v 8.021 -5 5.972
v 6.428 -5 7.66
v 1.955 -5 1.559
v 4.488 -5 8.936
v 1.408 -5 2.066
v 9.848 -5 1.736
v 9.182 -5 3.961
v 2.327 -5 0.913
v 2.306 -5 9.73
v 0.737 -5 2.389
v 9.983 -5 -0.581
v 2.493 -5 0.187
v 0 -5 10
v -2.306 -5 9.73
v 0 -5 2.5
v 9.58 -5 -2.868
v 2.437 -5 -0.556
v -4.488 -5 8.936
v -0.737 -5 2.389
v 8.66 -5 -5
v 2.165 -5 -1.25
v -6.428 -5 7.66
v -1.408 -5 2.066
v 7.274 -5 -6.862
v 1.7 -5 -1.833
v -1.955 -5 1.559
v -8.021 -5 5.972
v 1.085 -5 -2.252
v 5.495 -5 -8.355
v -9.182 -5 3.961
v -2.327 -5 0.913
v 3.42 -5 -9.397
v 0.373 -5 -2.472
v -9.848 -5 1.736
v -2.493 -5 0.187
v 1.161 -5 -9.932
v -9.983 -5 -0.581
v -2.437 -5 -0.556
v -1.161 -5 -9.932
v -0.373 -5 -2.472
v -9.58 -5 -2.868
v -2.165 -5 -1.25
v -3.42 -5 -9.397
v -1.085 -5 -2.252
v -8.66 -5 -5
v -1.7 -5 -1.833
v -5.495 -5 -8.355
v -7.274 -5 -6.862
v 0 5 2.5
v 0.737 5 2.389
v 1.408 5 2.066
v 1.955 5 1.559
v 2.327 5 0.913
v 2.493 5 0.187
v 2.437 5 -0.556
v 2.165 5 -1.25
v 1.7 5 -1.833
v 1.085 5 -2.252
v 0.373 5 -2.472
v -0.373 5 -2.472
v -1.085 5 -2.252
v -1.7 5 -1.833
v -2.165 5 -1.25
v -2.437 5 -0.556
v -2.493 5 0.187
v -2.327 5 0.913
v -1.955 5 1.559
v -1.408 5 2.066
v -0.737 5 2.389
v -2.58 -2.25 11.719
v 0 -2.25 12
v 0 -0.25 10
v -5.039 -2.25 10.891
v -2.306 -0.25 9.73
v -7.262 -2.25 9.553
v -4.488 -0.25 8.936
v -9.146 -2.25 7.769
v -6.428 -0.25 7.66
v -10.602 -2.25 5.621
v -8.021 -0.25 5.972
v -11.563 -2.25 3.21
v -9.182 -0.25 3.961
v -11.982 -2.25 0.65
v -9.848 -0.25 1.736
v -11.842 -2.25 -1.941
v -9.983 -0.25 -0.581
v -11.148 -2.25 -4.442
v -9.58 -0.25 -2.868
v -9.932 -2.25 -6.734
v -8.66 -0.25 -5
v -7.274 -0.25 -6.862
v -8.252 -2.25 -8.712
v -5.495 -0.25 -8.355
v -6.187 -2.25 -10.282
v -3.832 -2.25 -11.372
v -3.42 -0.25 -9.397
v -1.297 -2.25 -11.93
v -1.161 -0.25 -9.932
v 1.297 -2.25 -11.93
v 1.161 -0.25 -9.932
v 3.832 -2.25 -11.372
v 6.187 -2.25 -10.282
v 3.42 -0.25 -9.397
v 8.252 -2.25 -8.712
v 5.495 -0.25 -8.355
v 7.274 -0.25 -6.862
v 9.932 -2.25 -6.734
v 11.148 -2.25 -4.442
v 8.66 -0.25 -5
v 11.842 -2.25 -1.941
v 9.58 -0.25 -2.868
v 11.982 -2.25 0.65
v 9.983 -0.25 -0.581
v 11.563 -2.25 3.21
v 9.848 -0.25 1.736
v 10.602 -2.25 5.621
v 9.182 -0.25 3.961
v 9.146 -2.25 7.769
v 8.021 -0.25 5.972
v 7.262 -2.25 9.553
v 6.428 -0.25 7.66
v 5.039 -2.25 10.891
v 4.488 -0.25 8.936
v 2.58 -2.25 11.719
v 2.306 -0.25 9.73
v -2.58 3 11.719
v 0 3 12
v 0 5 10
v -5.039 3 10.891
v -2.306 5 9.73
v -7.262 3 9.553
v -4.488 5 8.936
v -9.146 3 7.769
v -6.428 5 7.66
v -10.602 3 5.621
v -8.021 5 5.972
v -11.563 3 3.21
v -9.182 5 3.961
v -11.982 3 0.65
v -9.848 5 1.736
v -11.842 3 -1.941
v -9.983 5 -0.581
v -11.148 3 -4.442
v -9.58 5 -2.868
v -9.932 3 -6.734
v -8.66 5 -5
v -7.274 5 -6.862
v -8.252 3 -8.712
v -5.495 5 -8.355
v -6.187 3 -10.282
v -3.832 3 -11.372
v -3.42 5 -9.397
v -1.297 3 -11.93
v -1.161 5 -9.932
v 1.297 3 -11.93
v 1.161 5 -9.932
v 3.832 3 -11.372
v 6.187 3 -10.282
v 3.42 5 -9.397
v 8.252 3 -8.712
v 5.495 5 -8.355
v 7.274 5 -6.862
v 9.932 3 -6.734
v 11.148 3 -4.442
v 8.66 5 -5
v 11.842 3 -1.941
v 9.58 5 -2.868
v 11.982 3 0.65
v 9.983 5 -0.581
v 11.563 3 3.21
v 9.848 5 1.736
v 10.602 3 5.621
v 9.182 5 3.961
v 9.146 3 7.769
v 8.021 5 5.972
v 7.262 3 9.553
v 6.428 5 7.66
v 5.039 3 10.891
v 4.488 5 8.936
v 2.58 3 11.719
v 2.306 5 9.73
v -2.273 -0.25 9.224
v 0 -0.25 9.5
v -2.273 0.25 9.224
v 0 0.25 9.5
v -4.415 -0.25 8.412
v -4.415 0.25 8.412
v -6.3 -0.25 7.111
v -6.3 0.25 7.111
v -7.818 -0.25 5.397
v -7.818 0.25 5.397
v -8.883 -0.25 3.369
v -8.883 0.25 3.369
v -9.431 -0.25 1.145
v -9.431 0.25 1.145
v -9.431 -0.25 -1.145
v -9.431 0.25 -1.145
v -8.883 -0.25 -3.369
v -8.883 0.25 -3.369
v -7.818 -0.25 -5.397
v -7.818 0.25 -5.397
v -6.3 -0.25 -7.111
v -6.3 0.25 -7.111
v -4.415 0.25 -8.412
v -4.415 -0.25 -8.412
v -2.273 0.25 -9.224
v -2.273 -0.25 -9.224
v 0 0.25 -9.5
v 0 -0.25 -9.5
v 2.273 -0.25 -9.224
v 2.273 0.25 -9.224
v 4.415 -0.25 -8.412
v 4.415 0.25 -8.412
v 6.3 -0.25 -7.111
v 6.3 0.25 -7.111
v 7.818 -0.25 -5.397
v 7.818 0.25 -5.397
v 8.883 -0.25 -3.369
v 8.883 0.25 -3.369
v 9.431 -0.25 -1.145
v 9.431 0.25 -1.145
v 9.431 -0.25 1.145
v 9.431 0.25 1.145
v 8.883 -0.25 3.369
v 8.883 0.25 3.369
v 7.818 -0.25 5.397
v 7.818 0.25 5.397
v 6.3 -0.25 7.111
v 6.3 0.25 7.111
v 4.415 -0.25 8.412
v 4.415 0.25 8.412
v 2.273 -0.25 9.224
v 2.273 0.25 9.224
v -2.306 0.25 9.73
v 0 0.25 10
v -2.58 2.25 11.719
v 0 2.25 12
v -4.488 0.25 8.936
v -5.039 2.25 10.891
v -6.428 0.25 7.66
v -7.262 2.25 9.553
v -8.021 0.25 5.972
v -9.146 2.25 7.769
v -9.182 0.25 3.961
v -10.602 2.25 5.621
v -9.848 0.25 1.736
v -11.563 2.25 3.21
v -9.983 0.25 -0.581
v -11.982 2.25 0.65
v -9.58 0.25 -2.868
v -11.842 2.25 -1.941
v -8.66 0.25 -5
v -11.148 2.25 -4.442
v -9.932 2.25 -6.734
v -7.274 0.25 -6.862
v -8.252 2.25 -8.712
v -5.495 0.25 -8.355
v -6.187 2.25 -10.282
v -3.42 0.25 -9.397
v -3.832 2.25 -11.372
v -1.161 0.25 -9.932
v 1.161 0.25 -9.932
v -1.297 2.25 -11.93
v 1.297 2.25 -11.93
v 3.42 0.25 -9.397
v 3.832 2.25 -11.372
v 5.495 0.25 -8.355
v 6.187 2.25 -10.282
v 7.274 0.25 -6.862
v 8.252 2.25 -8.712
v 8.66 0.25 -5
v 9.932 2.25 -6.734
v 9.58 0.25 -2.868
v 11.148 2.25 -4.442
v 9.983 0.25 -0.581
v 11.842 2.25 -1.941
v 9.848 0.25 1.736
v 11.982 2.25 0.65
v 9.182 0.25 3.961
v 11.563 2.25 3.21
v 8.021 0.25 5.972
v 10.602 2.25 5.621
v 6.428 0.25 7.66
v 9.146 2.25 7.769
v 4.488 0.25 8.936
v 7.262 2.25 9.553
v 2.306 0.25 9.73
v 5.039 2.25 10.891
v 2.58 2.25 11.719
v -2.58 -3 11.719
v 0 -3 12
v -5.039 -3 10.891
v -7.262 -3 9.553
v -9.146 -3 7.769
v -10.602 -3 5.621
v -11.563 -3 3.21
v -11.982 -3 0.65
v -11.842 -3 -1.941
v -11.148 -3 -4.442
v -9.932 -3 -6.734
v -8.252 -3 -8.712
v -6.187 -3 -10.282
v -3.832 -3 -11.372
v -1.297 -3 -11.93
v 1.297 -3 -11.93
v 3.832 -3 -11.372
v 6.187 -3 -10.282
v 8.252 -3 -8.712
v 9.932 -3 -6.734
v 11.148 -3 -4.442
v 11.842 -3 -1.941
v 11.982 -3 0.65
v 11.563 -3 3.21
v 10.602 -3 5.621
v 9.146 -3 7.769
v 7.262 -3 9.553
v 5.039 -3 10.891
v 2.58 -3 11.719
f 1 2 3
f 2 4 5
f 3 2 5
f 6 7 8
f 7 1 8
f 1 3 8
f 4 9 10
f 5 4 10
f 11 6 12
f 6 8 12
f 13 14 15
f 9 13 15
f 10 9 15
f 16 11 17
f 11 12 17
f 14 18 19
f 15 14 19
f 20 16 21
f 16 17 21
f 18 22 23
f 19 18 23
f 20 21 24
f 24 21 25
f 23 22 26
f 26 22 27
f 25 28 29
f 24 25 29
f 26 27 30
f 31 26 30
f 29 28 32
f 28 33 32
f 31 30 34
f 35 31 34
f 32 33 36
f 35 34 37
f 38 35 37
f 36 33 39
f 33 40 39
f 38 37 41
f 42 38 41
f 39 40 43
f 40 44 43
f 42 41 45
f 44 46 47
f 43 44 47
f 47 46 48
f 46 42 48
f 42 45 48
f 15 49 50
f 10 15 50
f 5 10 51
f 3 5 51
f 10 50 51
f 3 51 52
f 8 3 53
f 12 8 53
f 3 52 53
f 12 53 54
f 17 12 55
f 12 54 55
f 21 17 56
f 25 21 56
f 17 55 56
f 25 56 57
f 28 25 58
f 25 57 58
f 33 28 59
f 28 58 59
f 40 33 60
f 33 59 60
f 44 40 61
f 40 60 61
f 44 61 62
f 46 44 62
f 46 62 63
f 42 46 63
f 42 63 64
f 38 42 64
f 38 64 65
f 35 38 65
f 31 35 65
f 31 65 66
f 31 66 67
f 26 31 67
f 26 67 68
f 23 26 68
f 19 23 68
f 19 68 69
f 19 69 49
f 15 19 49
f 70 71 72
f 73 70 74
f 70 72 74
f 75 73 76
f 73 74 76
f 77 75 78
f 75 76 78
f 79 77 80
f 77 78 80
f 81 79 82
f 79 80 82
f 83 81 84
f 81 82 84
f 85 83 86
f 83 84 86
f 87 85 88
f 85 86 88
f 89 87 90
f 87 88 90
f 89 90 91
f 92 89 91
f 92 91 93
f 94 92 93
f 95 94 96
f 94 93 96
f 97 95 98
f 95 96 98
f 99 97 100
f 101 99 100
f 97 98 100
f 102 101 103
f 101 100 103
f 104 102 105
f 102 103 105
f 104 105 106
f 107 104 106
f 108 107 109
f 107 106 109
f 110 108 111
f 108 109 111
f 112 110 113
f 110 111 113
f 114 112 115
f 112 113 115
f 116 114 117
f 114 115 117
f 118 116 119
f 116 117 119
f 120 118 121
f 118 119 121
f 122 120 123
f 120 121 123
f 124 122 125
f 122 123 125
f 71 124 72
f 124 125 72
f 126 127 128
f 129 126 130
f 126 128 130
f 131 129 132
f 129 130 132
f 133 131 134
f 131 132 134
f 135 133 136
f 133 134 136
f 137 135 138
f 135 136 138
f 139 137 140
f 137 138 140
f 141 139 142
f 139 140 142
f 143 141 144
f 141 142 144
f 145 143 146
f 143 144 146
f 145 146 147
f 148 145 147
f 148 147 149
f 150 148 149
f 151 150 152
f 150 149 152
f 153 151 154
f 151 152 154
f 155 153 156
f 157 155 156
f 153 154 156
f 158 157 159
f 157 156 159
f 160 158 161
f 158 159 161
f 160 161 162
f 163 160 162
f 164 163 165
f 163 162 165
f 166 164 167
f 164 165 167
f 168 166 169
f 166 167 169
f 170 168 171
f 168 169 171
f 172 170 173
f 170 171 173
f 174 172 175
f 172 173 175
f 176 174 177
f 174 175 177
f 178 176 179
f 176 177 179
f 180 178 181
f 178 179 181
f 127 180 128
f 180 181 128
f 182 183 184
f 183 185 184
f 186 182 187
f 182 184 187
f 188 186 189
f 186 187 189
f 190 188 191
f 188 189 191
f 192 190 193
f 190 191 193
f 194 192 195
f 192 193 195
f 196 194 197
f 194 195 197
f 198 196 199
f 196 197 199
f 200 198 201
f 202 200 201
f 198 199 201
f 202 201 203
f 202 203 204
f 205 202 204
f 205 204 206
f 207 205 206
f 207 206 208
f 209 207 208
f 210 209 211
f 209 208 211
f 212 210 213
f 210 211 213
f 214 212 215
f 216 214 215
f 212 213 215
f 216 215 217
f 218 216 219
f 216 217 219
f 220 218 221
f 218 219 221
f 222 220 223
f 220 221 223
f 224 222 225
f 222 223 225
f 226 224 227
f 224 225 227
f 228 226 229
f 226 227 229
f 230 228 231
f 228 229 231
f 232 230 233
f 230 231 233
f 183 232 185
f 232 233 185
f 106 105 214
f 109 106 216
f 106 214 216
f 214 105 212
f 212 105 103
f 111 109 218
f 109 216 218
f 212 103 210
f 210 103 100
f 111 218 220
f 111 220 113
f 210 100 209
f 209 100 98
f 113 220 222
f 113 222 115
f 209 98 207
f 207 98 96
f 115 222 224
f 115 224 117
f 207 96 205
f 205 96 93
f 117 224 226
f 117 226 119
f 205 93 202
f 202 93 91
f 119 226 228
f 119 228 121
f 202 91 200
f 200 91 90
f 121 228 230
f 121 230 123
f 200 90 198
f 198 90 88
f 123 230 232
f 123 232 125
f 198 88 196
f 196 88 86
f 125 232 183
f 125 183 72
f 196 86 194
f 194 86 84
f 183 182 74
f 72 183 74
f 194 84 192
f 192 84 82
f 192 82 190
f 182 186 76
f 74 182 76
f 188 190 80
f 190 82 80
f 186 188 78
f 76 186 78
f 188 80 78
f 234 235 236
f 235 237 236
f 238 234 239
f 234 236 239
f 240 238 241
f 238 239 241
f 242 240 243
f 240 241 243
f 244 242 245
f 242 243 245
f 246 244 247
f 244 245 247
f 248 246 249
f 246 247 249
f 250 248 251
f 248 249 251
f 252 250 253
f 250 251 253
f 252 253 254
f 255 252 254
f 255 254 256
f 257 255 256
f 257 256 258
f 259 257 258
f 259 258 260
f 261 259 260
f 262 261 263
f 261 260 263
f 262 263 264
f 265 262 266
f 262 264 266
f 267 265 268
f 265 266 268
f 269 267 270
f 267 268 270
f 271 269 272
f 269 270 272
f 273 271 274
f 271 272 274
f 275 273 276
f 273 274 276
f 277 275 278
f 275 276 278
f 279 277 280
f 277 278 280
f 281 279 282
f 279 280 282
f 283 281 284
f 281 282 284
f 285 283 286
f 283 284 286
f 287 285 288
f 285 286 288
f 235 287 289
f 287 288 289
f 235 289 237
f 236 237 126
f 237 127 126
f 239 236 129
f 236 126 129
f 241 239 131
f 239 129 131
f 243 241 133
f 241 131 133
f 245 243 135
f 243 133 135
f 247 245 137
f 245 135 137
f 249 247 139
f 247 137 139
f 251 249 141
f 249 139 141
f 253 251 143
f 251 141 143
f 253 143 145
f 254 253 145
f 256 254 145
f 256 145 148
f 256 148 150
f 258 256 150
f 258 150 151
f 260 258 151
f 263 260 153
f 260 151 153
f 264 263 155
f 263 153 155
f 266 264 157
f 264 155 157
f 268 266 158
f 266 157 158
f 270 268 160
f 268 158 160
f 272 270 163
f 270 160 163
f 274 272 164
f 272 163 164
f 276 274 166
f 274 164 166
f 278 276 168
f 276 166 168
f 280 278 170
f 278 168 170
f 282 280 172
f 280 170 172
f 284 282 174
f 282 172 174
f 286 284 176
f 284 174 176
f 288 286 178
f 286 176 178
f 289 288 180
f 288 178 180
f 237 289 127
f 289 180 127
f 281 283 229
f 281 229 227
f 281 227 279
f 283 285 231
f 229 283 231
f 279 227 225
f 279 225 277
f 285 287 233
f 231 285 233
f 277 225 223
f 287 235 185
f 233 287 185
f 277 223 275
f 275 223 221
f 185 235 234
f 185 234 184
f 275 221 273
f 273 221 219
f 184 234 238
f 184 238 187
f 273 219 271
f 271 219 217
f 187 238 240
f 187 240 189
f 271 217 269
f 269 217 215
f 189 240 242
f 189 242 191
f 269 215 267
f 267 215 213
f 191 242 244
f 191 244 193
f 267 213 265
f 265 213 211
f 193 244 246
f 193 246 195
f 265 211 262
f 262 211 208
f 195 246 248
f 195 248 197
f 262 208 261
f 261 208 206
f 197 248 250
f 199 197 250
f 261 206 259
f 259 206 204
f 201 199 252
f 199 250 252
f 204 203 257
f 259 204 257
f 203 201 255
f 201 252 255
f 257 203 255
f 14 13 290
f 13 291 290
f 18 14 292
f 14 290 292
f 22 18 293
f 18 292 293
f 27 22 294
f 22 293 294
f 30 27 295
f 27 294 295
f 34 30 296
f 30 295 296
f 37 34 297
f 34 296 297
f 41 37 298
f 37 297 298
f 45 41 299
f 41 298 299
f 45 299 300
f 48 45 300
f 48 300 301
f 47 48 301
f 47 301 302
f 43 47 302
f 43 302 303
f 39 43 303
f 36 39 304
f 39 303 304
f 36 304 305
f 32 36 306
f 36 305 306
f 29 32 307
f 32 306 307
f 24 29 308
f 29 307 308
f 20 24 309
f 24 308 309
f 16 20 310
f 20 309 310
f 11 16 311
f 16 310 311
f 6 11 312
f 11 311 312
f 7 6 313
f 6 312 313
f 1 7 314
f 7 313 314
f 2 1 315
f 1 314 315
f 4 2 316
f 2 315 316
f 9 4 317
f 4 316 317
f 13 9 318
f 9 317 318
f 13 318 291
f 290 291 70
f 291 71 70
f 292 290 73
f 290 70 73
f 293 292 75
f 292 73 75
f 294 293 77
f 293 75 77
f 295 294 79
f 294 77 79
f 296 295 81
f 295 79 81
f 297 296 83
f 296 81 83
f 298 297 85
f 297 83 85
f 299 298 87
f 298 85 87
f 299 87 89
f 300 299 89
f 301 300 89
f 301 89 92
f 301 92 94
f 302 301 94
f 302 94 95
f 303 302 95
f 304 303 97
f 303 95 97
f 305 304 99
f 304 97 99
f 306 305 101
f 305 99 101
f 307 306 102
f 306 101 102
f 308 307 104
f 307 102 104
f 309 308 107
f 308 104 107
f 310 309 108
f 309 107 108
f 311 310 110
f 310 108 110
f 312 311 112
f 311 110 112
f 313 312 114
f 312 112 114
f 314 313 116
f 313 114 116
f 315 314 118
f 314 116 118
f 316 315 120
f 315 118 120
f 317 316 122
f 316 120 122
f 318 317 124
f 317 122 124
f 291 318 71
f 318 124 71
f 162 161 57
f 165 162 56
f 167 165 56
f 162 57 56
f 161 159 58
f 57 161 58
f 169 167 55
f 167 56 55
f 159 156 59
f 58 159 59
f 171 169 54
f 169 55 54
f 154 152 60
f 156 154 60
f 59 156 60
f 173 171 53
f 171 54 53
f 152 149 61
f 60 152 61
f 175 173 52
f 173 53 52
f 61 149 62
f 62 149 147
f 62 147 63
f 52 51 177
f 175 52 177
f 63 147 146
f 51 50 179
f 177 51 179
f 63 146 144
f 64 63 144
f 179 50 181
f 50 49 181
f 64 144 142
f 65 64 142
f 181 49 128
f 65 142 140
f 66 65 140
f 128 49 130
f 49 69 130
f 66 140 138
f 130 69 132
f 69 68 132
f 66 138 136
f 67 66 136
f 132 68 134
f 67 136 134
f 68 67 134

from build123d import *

# Parameters (mm, degrees)
SKETCH_1_W          = 9.5
SKETCH_1_H          = 0.5
SKETCH_2_R          = 2.5
CUT_EXTRUDE_1_DEPTH = 20.697715604


with BuildPart() as part:
    # 草图1 → 旋转1 (revolve)
    with BuildSketch(Plane.XY, mode=Mode.PRIVATE) as revolve_1_sk:
        Polygon((10, 5), (0, 5), (0, 0.25), (9.5, 0.25), (10, 0.25), (12, 2.25), (12, 3), align=None)
        Polygon((9.5, -0.25), (0, -0.25), (0, -5), (10, -5), (12, -3), (12, -2.25), (10, -0.25), align=None)
        with Locations((4.75, 0)):
            Rectangle(SKETCH_1_W, SKETCH_1_H)
    revolve(revolve_1_sk.sketch.rotate(Axis((0, 5, 0), (0, -1, 0)), 90), axis=Axis((0, 5, 0), (0, -1, 0)))

    # 草图2 → 切除-拉伸1 (cut, through all)
    with BuildSketch(Plane(origin=(0, 5, 0), x_dir=(1, 0, 0), z_dir=(0, 1, 0))):
        with Locations(Location((0, 0, 0), (0, 0, 270))):
            Circle(SKETCH_2_R)
    extrude(amount=-CUT_EXTRUDE_1_DEPTH, mode=Mode.SUBTRACT)


solid = part.part
